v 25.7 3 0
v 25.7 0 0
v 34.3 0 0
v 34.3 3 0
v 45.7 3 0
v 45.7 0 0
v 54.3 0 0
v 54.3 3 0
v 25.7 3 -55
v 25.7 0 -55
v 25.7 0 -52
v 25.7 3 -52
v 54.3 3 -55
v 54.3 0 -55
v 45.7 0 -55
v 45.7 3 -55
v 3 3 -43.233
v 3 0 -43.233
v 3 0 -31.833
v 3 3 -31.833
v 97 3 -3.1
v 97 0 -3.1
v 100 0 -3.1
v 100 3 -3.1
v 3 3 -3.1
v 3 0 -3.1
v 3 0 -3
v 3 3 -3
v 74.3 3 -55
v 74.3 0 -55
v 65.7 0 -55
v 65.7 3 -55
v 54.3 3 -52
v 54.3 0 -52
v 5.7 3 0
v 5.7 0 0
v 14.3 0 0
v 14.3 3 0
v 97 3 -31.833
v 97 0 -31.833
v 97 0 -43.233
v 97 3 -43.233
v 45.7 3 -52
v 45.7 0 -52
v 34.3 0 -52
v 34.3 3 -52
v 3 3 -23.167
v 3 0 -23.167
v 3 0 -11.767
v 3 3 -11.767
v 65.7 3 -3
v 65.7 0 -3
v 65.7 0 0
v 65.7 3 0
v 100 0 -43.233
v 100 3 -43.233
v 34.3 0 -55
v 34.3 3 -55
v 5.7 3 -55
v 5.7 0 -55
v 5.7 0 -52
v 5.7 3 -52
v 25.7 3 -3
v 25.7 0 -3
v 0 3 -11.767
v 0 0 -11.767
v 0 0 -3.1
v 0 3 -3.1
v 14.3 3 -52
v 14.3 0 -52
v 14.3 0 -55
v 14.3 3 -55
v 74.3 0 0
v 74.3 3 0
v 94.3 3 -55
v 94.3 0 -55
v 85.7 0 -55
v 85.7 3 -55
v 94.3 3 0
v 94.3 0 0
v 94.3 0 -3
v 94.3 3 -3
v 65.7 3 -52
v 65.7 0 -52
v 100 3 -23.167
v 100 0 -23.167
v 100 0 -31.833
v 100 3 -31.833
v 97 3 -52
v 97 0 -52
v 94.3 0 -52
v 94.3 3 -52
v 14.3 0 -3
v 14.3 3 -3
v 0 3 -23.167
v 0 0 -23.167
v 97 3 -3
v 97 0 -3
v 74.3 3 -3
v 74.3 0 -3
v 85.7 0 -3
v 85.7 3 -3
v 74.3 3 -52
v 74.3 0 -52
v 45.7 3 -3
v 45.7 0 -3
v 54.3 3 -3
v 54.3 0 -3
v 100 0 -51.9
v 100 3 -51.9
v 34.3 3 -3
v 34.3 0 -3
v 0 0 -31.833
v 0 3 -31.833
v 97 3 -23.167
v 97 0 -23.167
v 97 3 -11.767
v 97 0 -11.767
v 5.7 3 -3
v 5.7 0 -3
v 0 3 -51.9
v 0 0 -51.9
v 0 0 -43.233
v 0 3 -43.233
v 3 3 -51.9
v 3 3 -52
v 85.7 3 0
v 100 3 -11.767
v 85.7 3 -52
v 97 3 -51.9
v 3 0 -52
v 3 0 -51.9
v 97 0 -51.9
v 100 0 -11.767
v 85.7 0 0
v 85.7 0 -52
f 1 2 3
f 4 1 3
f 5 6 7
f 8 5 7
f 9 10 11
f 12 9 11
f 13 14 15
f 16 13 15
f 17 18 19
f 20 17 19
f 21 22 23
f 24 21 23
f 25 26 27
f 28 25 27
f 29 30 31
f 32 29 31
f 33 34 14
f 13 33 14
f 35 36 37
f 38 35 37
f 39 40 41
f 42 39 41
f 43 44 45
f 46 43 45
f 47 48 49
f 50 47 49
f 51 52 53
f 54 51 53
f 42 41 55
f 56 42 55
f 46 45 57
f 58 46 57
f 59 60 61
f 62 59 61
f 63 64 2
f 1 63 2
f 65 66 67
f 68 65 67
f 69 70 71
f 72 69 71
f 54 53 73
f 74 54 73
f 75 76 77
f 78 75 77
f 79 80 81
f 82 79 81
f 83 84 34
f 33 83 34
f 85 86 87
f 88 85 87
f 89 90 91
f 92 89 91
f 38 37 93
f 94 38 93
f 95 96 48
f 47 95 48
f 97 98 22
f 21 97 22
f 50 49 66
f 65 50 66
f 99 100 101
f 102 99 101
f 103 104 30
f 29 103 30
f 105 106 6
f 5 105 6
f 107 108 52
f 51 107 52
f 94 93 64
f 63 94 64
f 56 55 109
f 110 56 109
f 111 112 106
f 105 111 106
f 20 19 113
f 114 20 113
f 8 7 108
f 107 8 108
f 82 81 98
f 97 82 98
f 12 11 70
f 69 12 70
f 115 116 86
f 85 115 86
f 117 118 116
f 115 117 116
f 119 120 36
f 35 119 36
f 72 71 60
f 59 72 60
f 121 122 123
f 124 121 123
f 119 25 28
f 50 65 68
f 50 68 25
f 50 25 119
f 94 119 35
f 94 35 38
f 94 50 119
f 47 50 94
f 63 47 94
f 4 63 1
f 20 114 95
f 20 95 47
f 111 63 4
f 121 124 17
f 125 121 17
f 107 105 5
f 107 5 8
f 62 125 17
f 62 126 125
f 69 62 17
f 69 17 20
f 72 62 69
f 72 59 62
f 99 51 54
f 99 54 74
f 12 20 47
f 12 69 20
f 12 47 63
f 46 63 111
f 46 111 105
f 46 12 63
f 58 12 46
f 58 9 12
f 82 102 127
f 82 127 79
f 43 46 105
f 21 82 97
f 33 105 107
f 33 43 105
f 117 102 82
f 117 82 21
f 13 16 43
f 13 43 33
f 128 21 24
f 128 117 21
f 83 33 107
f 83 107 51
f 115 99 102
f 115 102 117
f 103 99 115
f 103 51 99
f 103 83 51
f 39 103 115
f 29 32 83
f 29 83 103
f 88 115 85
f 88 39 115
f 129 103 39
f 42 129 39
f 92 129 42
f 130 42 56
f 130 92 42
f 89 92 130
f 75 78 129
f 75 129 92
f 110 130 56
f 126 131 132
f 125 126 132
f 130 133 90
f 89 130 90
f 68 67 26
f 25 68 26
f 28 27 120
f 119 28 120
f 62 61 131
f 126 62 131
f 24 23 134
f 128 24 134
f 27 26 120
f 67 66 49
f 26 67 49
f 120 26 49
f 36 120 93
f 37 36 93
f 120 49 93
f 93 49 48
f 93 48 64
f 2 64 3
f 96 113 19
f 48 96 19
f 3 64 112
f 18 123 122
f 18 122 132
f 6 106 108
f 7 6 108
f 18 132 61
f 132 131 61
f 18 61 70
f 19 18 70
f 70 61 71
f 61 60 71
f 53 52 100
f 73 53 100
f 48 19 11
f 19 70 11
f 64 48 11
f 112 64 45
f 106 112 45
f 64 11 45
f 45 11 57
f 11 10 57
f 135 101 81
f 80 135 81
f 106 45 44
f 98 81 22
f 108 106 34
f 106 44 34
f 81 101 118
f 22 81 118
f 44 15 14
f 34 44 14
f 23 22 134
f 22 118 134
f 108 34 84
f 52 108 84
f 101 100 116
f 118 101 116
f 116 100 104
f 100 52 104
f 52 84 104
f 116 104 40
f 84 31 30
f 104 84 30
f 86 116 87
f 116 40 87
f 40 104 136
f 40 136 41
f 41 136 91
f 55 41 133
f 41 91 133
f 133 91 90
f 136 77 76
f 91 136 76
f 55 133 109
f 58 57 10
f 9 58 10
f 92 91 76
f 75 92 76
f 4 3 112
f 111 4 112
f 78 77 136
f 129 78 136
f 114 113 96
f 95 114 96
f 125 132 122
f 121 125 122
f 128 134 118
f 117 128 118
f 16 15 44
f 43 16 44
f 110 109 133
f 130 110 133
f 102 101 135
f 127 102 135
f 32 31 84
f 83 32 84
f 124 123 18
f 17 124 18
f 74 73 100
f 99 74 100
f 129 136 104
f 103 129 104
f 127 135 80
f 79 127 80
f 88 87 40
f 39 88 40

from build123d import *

# Parameters (mm, degrees)
BOSS_EXTRU_1_DEPTH = 3


with BuildPart() as part:
    # Esquisse1 → Boss.-Extru.1 (new body)
    with BuildSketch(Plane(origin=(0, 0, 0), x_dir=(1, 0, 0), z_dir=(0, 1, 0))):
        Polygon((3, 31.833333333), (0, 31.833333333), (0, 23.166666667), (3, 23.166666667), (3, 17.466666667), (3, 11.766666667), (0, 11.766666667), (0, 3.1), (3, 3.1), (3, 3), (5.7, 3), (5.7, 0), (14.3, 0), (14.3, 3), (25.7, 3), (25.7, 0), (34.3, 0), (34.3, 3), (45.7, 3), (45.7, 0), (54.3, 0), (54.3, 3), (65.7, 3), (65.7, 0), (74.3, 0), (74.3, 3), (85.7, 3), (85.7, 0), (94.3, 0), (94.3, 3), (97, 3), (97, 3.1), (100, 3.1), (100, 11.766666667), (97, 11.766666667), (97, 23.166666667), (100, 23.166666667), (100, 31.833333333), (97, 31.833333333), (97, 43.233333333), (100, 43.233333333), (100, 51.9), (97, 51.9), (97, 52), (94.3, 52), (94.3, 55), (85.7, 55), (85.7, 52), (74.3, 52), (74.3, 55), (65.7, 55), (65.7, 52), (54.3, 52), (54.3, 55), (45.7, 55), (45.7, 52), (34.3, 52), (34.3, 55), (25.7, 55), (25.7, 52), (20, 52), (14.3, 52), (14.3, 55), (5.7, 55), (5.7, 52), (3, 52), (3, 51.9), (0, 51.9), (0, 43.233333333), (3, 43.233333333), align=None)
    extrude(amount=BOSS_EXTRU_1_DEPTH)


solid = part.part
